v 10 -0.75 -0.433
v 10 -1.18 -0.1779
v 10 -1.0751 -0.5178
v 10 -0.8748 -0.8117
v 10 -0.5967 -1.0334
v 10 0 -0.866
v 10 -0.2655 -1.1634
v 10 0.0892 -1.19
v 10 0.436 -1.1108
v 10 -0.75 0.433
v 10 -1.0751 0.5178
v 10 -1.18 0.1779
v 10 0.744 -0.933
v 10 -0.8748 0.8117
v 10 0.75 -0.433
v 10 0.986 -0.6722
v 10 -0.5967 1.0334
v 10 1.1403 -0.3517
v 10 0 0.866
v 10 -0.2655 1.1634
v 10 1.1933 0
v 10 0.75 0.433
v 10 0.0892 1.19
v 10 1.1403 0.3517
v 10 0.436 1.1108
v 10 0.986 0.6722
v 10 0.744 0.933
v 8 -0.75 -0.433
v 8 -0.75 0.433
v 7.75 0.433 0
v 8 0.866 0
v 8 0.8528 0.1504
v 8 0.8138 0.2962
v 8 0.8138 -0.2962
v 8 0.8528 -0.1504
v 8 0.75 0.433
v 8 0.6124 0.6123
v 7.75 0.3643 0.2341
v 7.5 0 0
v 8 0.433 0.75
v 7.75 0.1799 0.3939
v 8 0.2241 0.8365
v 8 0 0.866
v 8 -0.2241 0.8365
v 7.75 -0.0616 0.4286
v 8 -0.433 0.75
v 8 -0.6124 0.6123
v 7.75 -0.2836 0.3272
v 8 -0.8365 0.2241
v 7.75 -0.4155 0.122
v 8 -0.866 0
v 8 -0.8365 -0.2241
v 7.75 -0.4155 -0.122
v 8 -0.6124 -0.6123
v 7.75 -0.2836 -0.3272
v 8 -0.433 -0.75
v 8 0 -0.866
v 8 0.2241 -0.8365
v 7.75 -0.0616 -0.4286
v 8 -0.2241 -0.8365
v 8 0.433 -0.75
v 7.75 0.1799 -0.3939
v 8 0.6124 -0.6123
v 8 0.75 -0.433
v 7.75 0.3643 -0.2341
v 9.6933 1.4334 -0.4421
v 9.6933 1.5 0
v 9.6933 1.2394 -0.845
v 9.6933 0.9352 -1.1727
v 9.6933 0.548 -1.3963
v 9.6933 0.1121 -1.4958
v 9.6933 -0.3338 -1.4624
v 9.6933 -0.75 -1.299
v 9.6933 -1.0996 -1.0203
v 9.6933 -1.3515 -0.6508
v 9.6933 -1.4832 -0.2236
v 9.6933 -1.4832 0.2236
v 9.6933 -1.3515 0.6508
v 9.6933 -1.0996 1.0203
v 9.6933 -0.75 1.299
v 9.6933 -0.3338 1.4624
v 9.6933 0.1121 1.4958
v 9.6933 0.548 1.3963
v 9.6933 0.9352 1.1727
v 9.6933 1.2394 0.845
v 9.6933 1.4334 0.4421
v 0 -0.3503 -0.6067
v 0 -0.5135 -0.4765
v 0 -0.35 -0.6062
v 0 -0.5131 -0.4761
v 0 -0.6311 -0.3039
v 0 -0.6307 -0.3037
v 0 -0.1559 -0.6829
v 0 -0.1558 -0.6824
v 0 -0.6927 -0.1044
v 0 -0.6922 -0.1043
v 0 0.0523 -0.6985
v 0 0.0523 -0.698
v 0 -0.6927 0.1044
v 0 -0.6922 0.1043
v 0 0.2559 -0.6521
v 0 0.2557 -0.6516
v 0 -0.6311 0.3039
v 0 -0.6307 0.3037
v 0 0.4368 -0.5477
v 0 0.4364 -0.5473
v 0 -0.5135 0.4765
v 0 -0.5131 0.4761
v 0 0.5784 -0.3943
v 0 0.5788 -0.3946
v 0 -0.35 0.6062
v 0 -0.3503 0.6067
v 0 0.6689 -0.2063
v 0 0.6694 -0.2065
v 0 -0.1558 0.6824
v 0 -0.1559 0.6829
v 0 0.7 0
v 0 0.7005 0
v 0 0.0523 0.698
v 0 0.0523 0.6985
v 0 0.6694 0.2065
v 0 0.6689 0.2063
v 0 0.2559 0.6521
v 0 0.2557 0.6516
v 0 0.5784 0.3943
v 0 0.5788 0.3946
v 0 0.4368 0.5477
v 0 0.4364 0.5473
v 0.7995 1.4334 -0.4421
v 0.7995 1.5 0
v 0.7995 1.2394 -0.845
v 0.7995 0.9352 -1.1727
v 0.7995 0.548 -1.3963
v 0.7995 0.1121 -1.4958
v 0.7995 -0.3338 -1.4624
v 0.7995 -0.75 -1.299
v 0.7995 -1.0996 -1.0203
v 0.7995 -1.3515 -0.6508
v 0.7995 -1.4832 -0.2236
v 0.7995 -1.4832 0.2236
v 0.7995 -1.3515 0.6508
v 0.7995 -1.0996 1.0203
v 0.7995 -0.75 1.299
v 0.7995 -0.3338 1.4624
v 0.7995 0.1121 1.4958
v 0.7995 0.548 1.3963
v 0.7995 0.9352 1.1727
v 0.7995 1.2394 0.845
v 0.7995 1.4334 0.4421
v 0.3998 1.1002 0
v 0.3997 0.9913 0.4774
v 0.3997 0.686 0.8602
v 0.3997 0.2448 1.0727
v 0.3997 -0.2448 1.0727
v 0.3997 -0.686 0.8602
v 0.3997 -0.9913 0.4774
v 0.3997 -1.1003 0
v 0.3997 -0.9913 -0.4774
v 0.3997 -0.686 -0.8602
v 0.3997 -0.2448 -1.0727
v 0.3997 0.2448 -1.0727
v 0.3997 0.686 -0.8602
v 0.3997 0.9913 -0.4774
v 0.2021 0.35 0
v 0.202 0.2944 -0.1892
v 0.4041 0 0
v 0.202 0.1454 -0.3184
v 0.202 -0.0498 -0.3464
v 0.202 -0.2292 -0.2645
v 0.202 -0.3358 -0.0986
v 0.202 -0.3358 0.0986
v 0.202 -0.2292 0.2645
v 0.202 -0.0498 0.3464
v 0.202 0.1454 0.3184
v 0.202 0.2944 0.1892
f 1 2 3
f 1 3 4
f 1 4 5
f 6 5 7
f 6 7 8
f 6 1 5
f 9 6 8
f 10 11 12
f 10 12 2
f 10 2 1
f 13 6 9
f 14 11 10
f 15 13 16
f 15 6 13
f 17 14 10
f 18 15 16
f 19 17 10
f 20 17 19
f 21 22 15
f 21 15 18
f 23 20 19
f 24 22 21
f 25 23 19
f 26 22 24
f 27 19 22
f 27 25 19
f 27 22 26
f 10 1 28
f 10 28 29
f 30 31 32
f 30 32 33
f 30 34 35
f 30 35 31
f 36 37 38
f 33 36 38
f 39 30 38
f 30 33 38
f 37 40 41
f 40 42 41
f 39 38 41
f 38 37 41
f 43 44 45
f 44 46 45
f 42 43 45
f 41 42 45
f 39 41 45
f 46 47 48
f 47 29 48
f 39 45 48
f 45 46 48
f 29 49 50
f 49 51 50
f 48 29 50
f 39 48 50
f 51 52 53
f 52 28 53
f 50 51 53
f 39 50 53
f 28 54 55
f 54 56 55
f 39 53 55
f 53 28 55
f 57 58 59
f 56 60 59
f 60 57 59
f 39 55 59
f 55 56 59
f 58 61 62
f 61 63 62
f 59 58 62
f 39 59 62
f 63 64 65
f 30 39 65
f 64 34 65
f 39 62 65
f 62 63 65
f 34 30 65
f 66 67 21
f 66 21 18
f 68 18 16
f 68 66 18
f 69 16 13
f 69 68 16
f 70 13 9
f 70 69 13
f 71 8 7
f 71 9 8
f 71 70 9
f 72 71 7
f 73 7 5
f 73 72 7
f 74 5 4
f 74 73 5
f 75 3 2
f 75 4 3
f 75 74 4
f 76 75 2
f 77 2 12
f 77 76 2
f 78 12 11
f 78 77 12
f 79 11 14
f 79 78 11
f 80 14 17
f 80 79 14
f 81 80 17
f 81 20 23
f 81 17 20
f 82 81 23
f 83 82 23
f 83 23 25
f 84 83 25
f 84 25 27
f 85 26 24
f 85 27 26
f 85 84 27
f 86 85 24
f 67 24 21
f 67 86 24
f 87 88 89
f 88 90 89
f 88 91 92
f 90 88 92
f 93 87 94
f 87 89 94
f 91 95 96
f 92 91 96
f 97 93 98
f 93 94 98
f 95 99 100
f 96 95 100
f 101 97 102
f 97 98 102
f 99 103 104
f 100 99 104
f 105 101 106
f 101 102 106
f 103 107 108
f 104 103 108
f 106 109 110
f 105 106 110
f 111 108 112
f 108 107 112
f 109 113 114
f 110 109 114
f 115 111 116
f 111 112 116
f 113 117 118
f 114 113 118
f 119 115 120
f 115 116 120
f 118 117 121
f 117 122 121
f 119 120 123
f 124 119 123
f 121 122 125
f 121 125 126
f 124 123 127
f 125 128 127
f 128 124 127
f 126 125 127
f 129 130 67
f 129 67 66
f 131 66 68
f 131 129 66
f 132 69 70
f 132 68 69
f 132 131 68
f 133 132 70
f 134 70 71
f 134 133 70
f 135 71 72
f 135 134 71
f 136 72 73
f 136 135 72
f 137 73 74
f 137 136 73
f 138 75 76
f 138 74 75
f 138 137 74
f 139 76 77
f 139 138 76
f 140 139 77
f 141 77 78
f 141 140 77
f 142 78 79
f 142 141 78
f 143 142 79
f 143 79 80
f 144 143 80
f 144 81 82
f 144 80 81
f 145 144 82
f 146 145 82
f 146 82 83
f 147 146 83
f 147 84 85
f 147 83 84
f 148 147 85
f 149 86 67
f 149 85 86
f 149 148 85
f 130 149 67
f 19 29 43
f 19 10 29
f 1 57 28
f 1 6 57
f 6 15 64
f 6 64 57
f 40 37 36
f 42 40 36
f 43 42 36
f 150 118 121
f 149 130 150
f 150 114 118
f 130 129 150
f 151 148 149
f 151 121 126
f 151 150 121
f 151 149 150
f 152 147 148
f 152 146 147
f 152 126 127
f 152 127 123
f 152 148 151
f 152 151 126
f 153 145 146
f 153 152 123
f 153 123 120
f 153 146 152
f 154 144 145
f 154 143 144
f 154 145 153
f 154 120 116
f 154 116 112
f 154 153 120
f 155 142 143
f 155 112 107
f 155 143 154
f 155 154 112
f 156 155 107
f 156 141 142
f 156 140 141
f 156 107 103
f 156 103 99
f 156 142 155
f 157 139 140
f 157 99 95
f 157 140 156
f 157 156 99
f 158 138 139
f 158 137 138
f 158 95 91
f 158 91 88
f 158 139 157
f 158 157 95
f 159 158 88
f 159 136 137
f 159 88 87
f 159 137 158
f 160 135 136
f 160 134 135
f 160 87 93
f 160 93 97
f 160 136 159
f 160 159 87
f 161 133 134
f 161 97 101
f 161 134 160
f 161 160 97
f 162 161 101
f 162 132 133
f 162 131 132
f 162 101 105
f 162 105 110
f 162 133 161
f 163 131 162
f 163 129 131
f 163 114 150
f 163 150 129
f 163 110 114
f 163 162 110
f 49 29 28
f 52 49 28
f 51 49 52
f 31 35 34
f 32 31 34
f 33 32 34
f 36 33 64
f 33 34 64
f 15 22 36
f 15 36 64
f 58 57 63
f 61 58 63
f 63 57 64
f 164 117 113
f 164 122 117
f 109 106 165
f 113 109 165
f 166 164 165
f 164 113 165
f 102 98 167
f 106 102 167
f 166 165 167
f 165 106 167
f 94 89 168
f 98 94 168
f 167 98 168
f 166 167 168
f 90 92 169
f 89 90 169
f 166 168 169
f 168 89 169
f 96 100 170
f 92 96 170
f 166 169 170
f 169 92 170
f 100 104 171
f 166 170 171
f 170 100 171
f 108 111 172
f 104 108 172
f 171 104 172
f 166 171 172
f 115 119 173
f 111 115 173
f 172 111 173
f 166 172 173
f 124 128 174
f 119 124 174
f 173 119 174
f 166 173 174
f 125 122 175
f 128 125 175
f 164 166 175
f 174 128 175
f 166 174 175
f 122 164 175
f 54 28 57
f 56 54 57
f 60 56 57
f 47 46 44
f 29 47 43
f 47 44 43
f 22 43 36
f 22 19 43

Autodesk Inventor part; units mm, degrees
ref_plane "YZ Plane" through (0, 0, 0) normal (1, 0, 0) x (0, 1, 0)
ref_plane "XZ Plane" through (0, 0, 0) normal (0, 1, 0) x (-1, 0, 0)
sketch "Sketch1" plane through (0, 0, 0) normal (0, 0, 1) x (1, 0, 0)
  line L0 (0.4041, 0) -> (7.5, 0)
  line L1 (10, 0.866) -> (10, 1.5)
  line L2 (10, 1.5) -> (0, 1.5)
  line L3 (10, 0.866) -> (8, 0.866)
  line L4 (8, 0.866) -> (7.5, 0)
  line L5 (0, 0.7) -> (0.4041, 0)
  line L6 (0, -0.3) -> (0, 1.8) projected
  line L7 (0, 0.7) -> (0, 1.5)
  point P0 (0, 0)
  dimension "d0" = 2
  dimension "d1" = 60
  dimension "d2" = 3
  dimension "d3" = 1.7321
  dimension "d4" = 10
  dimension "d5" = 60
  dimension "d7" = 1.4
revolve "Body" add sketch "Sketch1" angle 360 about axis through (0.4041, 0, 0) along (1, 0, 0)
sketch "Sketch2" plane through (10, 0, 0) normal (1, 0, 0) x (0, 0, -1)
  circle A0 centre (0, 0) radius 0.866 projected
  circle A1 centre (0, 0) radius 1.5 projected
  line L0 (0.866, 0) -> (0.433, -0.75)
  line L1 (0.433, -0.75) -> (-0.433, -0.75)
  line L2 (-0.433, -0.75) -> (-0.866, 0)
  line L3 (-0.866, 0) -> (-0.433, 0.75)
  line L4 (-0.433, 0.75) -> (0.433, 0.75)
  line L5 (0.433, 0.75) -> (0.866, 0)
extrude "Slot" add sketch "Sketch2" against normal blind 2 contours L5 A0 | A0 L0 | L4 A0 | A0 L1 | L3 A0 | A0 L2
chamfer "Chamfer1" distance 0.8 angle 45 1 edges at (0, -1.5, 0) measured on face at (0, 1.2188, -0.1197)
thread "Thread" size "M3x0.5" class "6g" standard "ISO Metric profile" length 10
chamfer "Chamfer2" distance 0.3067 angle 45 1 edges at (10, -1.5, 0) measured on face at (3.8663, 1.4806, -0.2406)
ref_plane "Work Plane1" through (5, 0, 0) normal (0, -0.5, -0.866) x (1, 0, 0)
equation "\"d0\" = INTI"
equation "\"d2\" = NND"
equation "\"d3\" = 1.1547 * SW"
equation "\"d4\" = NLG"
equation "\"d5\" = 0.5 * ANG"
equation "\"d7\" = SPD"
equation "\"d8\" = INTI"
equation "\"d10\" = -0.5 * SPD + 0.5 * NND"
equation "\"d11\" = FAWI"
equation "\"d33\" = -0.5 * SPD + 0.5 * NND"
equation "\"d14\" = NLG"
equation "\"d12\" = -0.5 * GD1 + 0.5 * NND"
equation "\"d13\" = FAWI"
equation "\"d34\" = -0.5 * GD1 + 0.5 * NND"
equation "\"NND\" = 3"
equation "\"NLG\" = 10"
equation "\"INTI\" = 2"
equation "\"FAWI\" = 45deg"
equation "\"SW\" = 1.5"
equation "\"GD1\" = THREADDIA - 1.2269 * PTC"
equation "\"ANG\" = 120deg"
equation "\"FAWI1\" = 45deg"
equation "\"SPD\" = 1.4"
equation "\"GUL\" = 0.61345 * PTC"
equation "\"TOA\" = 30deg"
equation "\"THREADDIA\" = 3"
equation "\"PTC\" = 0.5"
equation "\"GAL\" = 0.61345 * PTC"
equation "\"E0\" = 1.155 * SW"
properties part number "DIN 916 - M3  x  10" material "Steel, Mild"
